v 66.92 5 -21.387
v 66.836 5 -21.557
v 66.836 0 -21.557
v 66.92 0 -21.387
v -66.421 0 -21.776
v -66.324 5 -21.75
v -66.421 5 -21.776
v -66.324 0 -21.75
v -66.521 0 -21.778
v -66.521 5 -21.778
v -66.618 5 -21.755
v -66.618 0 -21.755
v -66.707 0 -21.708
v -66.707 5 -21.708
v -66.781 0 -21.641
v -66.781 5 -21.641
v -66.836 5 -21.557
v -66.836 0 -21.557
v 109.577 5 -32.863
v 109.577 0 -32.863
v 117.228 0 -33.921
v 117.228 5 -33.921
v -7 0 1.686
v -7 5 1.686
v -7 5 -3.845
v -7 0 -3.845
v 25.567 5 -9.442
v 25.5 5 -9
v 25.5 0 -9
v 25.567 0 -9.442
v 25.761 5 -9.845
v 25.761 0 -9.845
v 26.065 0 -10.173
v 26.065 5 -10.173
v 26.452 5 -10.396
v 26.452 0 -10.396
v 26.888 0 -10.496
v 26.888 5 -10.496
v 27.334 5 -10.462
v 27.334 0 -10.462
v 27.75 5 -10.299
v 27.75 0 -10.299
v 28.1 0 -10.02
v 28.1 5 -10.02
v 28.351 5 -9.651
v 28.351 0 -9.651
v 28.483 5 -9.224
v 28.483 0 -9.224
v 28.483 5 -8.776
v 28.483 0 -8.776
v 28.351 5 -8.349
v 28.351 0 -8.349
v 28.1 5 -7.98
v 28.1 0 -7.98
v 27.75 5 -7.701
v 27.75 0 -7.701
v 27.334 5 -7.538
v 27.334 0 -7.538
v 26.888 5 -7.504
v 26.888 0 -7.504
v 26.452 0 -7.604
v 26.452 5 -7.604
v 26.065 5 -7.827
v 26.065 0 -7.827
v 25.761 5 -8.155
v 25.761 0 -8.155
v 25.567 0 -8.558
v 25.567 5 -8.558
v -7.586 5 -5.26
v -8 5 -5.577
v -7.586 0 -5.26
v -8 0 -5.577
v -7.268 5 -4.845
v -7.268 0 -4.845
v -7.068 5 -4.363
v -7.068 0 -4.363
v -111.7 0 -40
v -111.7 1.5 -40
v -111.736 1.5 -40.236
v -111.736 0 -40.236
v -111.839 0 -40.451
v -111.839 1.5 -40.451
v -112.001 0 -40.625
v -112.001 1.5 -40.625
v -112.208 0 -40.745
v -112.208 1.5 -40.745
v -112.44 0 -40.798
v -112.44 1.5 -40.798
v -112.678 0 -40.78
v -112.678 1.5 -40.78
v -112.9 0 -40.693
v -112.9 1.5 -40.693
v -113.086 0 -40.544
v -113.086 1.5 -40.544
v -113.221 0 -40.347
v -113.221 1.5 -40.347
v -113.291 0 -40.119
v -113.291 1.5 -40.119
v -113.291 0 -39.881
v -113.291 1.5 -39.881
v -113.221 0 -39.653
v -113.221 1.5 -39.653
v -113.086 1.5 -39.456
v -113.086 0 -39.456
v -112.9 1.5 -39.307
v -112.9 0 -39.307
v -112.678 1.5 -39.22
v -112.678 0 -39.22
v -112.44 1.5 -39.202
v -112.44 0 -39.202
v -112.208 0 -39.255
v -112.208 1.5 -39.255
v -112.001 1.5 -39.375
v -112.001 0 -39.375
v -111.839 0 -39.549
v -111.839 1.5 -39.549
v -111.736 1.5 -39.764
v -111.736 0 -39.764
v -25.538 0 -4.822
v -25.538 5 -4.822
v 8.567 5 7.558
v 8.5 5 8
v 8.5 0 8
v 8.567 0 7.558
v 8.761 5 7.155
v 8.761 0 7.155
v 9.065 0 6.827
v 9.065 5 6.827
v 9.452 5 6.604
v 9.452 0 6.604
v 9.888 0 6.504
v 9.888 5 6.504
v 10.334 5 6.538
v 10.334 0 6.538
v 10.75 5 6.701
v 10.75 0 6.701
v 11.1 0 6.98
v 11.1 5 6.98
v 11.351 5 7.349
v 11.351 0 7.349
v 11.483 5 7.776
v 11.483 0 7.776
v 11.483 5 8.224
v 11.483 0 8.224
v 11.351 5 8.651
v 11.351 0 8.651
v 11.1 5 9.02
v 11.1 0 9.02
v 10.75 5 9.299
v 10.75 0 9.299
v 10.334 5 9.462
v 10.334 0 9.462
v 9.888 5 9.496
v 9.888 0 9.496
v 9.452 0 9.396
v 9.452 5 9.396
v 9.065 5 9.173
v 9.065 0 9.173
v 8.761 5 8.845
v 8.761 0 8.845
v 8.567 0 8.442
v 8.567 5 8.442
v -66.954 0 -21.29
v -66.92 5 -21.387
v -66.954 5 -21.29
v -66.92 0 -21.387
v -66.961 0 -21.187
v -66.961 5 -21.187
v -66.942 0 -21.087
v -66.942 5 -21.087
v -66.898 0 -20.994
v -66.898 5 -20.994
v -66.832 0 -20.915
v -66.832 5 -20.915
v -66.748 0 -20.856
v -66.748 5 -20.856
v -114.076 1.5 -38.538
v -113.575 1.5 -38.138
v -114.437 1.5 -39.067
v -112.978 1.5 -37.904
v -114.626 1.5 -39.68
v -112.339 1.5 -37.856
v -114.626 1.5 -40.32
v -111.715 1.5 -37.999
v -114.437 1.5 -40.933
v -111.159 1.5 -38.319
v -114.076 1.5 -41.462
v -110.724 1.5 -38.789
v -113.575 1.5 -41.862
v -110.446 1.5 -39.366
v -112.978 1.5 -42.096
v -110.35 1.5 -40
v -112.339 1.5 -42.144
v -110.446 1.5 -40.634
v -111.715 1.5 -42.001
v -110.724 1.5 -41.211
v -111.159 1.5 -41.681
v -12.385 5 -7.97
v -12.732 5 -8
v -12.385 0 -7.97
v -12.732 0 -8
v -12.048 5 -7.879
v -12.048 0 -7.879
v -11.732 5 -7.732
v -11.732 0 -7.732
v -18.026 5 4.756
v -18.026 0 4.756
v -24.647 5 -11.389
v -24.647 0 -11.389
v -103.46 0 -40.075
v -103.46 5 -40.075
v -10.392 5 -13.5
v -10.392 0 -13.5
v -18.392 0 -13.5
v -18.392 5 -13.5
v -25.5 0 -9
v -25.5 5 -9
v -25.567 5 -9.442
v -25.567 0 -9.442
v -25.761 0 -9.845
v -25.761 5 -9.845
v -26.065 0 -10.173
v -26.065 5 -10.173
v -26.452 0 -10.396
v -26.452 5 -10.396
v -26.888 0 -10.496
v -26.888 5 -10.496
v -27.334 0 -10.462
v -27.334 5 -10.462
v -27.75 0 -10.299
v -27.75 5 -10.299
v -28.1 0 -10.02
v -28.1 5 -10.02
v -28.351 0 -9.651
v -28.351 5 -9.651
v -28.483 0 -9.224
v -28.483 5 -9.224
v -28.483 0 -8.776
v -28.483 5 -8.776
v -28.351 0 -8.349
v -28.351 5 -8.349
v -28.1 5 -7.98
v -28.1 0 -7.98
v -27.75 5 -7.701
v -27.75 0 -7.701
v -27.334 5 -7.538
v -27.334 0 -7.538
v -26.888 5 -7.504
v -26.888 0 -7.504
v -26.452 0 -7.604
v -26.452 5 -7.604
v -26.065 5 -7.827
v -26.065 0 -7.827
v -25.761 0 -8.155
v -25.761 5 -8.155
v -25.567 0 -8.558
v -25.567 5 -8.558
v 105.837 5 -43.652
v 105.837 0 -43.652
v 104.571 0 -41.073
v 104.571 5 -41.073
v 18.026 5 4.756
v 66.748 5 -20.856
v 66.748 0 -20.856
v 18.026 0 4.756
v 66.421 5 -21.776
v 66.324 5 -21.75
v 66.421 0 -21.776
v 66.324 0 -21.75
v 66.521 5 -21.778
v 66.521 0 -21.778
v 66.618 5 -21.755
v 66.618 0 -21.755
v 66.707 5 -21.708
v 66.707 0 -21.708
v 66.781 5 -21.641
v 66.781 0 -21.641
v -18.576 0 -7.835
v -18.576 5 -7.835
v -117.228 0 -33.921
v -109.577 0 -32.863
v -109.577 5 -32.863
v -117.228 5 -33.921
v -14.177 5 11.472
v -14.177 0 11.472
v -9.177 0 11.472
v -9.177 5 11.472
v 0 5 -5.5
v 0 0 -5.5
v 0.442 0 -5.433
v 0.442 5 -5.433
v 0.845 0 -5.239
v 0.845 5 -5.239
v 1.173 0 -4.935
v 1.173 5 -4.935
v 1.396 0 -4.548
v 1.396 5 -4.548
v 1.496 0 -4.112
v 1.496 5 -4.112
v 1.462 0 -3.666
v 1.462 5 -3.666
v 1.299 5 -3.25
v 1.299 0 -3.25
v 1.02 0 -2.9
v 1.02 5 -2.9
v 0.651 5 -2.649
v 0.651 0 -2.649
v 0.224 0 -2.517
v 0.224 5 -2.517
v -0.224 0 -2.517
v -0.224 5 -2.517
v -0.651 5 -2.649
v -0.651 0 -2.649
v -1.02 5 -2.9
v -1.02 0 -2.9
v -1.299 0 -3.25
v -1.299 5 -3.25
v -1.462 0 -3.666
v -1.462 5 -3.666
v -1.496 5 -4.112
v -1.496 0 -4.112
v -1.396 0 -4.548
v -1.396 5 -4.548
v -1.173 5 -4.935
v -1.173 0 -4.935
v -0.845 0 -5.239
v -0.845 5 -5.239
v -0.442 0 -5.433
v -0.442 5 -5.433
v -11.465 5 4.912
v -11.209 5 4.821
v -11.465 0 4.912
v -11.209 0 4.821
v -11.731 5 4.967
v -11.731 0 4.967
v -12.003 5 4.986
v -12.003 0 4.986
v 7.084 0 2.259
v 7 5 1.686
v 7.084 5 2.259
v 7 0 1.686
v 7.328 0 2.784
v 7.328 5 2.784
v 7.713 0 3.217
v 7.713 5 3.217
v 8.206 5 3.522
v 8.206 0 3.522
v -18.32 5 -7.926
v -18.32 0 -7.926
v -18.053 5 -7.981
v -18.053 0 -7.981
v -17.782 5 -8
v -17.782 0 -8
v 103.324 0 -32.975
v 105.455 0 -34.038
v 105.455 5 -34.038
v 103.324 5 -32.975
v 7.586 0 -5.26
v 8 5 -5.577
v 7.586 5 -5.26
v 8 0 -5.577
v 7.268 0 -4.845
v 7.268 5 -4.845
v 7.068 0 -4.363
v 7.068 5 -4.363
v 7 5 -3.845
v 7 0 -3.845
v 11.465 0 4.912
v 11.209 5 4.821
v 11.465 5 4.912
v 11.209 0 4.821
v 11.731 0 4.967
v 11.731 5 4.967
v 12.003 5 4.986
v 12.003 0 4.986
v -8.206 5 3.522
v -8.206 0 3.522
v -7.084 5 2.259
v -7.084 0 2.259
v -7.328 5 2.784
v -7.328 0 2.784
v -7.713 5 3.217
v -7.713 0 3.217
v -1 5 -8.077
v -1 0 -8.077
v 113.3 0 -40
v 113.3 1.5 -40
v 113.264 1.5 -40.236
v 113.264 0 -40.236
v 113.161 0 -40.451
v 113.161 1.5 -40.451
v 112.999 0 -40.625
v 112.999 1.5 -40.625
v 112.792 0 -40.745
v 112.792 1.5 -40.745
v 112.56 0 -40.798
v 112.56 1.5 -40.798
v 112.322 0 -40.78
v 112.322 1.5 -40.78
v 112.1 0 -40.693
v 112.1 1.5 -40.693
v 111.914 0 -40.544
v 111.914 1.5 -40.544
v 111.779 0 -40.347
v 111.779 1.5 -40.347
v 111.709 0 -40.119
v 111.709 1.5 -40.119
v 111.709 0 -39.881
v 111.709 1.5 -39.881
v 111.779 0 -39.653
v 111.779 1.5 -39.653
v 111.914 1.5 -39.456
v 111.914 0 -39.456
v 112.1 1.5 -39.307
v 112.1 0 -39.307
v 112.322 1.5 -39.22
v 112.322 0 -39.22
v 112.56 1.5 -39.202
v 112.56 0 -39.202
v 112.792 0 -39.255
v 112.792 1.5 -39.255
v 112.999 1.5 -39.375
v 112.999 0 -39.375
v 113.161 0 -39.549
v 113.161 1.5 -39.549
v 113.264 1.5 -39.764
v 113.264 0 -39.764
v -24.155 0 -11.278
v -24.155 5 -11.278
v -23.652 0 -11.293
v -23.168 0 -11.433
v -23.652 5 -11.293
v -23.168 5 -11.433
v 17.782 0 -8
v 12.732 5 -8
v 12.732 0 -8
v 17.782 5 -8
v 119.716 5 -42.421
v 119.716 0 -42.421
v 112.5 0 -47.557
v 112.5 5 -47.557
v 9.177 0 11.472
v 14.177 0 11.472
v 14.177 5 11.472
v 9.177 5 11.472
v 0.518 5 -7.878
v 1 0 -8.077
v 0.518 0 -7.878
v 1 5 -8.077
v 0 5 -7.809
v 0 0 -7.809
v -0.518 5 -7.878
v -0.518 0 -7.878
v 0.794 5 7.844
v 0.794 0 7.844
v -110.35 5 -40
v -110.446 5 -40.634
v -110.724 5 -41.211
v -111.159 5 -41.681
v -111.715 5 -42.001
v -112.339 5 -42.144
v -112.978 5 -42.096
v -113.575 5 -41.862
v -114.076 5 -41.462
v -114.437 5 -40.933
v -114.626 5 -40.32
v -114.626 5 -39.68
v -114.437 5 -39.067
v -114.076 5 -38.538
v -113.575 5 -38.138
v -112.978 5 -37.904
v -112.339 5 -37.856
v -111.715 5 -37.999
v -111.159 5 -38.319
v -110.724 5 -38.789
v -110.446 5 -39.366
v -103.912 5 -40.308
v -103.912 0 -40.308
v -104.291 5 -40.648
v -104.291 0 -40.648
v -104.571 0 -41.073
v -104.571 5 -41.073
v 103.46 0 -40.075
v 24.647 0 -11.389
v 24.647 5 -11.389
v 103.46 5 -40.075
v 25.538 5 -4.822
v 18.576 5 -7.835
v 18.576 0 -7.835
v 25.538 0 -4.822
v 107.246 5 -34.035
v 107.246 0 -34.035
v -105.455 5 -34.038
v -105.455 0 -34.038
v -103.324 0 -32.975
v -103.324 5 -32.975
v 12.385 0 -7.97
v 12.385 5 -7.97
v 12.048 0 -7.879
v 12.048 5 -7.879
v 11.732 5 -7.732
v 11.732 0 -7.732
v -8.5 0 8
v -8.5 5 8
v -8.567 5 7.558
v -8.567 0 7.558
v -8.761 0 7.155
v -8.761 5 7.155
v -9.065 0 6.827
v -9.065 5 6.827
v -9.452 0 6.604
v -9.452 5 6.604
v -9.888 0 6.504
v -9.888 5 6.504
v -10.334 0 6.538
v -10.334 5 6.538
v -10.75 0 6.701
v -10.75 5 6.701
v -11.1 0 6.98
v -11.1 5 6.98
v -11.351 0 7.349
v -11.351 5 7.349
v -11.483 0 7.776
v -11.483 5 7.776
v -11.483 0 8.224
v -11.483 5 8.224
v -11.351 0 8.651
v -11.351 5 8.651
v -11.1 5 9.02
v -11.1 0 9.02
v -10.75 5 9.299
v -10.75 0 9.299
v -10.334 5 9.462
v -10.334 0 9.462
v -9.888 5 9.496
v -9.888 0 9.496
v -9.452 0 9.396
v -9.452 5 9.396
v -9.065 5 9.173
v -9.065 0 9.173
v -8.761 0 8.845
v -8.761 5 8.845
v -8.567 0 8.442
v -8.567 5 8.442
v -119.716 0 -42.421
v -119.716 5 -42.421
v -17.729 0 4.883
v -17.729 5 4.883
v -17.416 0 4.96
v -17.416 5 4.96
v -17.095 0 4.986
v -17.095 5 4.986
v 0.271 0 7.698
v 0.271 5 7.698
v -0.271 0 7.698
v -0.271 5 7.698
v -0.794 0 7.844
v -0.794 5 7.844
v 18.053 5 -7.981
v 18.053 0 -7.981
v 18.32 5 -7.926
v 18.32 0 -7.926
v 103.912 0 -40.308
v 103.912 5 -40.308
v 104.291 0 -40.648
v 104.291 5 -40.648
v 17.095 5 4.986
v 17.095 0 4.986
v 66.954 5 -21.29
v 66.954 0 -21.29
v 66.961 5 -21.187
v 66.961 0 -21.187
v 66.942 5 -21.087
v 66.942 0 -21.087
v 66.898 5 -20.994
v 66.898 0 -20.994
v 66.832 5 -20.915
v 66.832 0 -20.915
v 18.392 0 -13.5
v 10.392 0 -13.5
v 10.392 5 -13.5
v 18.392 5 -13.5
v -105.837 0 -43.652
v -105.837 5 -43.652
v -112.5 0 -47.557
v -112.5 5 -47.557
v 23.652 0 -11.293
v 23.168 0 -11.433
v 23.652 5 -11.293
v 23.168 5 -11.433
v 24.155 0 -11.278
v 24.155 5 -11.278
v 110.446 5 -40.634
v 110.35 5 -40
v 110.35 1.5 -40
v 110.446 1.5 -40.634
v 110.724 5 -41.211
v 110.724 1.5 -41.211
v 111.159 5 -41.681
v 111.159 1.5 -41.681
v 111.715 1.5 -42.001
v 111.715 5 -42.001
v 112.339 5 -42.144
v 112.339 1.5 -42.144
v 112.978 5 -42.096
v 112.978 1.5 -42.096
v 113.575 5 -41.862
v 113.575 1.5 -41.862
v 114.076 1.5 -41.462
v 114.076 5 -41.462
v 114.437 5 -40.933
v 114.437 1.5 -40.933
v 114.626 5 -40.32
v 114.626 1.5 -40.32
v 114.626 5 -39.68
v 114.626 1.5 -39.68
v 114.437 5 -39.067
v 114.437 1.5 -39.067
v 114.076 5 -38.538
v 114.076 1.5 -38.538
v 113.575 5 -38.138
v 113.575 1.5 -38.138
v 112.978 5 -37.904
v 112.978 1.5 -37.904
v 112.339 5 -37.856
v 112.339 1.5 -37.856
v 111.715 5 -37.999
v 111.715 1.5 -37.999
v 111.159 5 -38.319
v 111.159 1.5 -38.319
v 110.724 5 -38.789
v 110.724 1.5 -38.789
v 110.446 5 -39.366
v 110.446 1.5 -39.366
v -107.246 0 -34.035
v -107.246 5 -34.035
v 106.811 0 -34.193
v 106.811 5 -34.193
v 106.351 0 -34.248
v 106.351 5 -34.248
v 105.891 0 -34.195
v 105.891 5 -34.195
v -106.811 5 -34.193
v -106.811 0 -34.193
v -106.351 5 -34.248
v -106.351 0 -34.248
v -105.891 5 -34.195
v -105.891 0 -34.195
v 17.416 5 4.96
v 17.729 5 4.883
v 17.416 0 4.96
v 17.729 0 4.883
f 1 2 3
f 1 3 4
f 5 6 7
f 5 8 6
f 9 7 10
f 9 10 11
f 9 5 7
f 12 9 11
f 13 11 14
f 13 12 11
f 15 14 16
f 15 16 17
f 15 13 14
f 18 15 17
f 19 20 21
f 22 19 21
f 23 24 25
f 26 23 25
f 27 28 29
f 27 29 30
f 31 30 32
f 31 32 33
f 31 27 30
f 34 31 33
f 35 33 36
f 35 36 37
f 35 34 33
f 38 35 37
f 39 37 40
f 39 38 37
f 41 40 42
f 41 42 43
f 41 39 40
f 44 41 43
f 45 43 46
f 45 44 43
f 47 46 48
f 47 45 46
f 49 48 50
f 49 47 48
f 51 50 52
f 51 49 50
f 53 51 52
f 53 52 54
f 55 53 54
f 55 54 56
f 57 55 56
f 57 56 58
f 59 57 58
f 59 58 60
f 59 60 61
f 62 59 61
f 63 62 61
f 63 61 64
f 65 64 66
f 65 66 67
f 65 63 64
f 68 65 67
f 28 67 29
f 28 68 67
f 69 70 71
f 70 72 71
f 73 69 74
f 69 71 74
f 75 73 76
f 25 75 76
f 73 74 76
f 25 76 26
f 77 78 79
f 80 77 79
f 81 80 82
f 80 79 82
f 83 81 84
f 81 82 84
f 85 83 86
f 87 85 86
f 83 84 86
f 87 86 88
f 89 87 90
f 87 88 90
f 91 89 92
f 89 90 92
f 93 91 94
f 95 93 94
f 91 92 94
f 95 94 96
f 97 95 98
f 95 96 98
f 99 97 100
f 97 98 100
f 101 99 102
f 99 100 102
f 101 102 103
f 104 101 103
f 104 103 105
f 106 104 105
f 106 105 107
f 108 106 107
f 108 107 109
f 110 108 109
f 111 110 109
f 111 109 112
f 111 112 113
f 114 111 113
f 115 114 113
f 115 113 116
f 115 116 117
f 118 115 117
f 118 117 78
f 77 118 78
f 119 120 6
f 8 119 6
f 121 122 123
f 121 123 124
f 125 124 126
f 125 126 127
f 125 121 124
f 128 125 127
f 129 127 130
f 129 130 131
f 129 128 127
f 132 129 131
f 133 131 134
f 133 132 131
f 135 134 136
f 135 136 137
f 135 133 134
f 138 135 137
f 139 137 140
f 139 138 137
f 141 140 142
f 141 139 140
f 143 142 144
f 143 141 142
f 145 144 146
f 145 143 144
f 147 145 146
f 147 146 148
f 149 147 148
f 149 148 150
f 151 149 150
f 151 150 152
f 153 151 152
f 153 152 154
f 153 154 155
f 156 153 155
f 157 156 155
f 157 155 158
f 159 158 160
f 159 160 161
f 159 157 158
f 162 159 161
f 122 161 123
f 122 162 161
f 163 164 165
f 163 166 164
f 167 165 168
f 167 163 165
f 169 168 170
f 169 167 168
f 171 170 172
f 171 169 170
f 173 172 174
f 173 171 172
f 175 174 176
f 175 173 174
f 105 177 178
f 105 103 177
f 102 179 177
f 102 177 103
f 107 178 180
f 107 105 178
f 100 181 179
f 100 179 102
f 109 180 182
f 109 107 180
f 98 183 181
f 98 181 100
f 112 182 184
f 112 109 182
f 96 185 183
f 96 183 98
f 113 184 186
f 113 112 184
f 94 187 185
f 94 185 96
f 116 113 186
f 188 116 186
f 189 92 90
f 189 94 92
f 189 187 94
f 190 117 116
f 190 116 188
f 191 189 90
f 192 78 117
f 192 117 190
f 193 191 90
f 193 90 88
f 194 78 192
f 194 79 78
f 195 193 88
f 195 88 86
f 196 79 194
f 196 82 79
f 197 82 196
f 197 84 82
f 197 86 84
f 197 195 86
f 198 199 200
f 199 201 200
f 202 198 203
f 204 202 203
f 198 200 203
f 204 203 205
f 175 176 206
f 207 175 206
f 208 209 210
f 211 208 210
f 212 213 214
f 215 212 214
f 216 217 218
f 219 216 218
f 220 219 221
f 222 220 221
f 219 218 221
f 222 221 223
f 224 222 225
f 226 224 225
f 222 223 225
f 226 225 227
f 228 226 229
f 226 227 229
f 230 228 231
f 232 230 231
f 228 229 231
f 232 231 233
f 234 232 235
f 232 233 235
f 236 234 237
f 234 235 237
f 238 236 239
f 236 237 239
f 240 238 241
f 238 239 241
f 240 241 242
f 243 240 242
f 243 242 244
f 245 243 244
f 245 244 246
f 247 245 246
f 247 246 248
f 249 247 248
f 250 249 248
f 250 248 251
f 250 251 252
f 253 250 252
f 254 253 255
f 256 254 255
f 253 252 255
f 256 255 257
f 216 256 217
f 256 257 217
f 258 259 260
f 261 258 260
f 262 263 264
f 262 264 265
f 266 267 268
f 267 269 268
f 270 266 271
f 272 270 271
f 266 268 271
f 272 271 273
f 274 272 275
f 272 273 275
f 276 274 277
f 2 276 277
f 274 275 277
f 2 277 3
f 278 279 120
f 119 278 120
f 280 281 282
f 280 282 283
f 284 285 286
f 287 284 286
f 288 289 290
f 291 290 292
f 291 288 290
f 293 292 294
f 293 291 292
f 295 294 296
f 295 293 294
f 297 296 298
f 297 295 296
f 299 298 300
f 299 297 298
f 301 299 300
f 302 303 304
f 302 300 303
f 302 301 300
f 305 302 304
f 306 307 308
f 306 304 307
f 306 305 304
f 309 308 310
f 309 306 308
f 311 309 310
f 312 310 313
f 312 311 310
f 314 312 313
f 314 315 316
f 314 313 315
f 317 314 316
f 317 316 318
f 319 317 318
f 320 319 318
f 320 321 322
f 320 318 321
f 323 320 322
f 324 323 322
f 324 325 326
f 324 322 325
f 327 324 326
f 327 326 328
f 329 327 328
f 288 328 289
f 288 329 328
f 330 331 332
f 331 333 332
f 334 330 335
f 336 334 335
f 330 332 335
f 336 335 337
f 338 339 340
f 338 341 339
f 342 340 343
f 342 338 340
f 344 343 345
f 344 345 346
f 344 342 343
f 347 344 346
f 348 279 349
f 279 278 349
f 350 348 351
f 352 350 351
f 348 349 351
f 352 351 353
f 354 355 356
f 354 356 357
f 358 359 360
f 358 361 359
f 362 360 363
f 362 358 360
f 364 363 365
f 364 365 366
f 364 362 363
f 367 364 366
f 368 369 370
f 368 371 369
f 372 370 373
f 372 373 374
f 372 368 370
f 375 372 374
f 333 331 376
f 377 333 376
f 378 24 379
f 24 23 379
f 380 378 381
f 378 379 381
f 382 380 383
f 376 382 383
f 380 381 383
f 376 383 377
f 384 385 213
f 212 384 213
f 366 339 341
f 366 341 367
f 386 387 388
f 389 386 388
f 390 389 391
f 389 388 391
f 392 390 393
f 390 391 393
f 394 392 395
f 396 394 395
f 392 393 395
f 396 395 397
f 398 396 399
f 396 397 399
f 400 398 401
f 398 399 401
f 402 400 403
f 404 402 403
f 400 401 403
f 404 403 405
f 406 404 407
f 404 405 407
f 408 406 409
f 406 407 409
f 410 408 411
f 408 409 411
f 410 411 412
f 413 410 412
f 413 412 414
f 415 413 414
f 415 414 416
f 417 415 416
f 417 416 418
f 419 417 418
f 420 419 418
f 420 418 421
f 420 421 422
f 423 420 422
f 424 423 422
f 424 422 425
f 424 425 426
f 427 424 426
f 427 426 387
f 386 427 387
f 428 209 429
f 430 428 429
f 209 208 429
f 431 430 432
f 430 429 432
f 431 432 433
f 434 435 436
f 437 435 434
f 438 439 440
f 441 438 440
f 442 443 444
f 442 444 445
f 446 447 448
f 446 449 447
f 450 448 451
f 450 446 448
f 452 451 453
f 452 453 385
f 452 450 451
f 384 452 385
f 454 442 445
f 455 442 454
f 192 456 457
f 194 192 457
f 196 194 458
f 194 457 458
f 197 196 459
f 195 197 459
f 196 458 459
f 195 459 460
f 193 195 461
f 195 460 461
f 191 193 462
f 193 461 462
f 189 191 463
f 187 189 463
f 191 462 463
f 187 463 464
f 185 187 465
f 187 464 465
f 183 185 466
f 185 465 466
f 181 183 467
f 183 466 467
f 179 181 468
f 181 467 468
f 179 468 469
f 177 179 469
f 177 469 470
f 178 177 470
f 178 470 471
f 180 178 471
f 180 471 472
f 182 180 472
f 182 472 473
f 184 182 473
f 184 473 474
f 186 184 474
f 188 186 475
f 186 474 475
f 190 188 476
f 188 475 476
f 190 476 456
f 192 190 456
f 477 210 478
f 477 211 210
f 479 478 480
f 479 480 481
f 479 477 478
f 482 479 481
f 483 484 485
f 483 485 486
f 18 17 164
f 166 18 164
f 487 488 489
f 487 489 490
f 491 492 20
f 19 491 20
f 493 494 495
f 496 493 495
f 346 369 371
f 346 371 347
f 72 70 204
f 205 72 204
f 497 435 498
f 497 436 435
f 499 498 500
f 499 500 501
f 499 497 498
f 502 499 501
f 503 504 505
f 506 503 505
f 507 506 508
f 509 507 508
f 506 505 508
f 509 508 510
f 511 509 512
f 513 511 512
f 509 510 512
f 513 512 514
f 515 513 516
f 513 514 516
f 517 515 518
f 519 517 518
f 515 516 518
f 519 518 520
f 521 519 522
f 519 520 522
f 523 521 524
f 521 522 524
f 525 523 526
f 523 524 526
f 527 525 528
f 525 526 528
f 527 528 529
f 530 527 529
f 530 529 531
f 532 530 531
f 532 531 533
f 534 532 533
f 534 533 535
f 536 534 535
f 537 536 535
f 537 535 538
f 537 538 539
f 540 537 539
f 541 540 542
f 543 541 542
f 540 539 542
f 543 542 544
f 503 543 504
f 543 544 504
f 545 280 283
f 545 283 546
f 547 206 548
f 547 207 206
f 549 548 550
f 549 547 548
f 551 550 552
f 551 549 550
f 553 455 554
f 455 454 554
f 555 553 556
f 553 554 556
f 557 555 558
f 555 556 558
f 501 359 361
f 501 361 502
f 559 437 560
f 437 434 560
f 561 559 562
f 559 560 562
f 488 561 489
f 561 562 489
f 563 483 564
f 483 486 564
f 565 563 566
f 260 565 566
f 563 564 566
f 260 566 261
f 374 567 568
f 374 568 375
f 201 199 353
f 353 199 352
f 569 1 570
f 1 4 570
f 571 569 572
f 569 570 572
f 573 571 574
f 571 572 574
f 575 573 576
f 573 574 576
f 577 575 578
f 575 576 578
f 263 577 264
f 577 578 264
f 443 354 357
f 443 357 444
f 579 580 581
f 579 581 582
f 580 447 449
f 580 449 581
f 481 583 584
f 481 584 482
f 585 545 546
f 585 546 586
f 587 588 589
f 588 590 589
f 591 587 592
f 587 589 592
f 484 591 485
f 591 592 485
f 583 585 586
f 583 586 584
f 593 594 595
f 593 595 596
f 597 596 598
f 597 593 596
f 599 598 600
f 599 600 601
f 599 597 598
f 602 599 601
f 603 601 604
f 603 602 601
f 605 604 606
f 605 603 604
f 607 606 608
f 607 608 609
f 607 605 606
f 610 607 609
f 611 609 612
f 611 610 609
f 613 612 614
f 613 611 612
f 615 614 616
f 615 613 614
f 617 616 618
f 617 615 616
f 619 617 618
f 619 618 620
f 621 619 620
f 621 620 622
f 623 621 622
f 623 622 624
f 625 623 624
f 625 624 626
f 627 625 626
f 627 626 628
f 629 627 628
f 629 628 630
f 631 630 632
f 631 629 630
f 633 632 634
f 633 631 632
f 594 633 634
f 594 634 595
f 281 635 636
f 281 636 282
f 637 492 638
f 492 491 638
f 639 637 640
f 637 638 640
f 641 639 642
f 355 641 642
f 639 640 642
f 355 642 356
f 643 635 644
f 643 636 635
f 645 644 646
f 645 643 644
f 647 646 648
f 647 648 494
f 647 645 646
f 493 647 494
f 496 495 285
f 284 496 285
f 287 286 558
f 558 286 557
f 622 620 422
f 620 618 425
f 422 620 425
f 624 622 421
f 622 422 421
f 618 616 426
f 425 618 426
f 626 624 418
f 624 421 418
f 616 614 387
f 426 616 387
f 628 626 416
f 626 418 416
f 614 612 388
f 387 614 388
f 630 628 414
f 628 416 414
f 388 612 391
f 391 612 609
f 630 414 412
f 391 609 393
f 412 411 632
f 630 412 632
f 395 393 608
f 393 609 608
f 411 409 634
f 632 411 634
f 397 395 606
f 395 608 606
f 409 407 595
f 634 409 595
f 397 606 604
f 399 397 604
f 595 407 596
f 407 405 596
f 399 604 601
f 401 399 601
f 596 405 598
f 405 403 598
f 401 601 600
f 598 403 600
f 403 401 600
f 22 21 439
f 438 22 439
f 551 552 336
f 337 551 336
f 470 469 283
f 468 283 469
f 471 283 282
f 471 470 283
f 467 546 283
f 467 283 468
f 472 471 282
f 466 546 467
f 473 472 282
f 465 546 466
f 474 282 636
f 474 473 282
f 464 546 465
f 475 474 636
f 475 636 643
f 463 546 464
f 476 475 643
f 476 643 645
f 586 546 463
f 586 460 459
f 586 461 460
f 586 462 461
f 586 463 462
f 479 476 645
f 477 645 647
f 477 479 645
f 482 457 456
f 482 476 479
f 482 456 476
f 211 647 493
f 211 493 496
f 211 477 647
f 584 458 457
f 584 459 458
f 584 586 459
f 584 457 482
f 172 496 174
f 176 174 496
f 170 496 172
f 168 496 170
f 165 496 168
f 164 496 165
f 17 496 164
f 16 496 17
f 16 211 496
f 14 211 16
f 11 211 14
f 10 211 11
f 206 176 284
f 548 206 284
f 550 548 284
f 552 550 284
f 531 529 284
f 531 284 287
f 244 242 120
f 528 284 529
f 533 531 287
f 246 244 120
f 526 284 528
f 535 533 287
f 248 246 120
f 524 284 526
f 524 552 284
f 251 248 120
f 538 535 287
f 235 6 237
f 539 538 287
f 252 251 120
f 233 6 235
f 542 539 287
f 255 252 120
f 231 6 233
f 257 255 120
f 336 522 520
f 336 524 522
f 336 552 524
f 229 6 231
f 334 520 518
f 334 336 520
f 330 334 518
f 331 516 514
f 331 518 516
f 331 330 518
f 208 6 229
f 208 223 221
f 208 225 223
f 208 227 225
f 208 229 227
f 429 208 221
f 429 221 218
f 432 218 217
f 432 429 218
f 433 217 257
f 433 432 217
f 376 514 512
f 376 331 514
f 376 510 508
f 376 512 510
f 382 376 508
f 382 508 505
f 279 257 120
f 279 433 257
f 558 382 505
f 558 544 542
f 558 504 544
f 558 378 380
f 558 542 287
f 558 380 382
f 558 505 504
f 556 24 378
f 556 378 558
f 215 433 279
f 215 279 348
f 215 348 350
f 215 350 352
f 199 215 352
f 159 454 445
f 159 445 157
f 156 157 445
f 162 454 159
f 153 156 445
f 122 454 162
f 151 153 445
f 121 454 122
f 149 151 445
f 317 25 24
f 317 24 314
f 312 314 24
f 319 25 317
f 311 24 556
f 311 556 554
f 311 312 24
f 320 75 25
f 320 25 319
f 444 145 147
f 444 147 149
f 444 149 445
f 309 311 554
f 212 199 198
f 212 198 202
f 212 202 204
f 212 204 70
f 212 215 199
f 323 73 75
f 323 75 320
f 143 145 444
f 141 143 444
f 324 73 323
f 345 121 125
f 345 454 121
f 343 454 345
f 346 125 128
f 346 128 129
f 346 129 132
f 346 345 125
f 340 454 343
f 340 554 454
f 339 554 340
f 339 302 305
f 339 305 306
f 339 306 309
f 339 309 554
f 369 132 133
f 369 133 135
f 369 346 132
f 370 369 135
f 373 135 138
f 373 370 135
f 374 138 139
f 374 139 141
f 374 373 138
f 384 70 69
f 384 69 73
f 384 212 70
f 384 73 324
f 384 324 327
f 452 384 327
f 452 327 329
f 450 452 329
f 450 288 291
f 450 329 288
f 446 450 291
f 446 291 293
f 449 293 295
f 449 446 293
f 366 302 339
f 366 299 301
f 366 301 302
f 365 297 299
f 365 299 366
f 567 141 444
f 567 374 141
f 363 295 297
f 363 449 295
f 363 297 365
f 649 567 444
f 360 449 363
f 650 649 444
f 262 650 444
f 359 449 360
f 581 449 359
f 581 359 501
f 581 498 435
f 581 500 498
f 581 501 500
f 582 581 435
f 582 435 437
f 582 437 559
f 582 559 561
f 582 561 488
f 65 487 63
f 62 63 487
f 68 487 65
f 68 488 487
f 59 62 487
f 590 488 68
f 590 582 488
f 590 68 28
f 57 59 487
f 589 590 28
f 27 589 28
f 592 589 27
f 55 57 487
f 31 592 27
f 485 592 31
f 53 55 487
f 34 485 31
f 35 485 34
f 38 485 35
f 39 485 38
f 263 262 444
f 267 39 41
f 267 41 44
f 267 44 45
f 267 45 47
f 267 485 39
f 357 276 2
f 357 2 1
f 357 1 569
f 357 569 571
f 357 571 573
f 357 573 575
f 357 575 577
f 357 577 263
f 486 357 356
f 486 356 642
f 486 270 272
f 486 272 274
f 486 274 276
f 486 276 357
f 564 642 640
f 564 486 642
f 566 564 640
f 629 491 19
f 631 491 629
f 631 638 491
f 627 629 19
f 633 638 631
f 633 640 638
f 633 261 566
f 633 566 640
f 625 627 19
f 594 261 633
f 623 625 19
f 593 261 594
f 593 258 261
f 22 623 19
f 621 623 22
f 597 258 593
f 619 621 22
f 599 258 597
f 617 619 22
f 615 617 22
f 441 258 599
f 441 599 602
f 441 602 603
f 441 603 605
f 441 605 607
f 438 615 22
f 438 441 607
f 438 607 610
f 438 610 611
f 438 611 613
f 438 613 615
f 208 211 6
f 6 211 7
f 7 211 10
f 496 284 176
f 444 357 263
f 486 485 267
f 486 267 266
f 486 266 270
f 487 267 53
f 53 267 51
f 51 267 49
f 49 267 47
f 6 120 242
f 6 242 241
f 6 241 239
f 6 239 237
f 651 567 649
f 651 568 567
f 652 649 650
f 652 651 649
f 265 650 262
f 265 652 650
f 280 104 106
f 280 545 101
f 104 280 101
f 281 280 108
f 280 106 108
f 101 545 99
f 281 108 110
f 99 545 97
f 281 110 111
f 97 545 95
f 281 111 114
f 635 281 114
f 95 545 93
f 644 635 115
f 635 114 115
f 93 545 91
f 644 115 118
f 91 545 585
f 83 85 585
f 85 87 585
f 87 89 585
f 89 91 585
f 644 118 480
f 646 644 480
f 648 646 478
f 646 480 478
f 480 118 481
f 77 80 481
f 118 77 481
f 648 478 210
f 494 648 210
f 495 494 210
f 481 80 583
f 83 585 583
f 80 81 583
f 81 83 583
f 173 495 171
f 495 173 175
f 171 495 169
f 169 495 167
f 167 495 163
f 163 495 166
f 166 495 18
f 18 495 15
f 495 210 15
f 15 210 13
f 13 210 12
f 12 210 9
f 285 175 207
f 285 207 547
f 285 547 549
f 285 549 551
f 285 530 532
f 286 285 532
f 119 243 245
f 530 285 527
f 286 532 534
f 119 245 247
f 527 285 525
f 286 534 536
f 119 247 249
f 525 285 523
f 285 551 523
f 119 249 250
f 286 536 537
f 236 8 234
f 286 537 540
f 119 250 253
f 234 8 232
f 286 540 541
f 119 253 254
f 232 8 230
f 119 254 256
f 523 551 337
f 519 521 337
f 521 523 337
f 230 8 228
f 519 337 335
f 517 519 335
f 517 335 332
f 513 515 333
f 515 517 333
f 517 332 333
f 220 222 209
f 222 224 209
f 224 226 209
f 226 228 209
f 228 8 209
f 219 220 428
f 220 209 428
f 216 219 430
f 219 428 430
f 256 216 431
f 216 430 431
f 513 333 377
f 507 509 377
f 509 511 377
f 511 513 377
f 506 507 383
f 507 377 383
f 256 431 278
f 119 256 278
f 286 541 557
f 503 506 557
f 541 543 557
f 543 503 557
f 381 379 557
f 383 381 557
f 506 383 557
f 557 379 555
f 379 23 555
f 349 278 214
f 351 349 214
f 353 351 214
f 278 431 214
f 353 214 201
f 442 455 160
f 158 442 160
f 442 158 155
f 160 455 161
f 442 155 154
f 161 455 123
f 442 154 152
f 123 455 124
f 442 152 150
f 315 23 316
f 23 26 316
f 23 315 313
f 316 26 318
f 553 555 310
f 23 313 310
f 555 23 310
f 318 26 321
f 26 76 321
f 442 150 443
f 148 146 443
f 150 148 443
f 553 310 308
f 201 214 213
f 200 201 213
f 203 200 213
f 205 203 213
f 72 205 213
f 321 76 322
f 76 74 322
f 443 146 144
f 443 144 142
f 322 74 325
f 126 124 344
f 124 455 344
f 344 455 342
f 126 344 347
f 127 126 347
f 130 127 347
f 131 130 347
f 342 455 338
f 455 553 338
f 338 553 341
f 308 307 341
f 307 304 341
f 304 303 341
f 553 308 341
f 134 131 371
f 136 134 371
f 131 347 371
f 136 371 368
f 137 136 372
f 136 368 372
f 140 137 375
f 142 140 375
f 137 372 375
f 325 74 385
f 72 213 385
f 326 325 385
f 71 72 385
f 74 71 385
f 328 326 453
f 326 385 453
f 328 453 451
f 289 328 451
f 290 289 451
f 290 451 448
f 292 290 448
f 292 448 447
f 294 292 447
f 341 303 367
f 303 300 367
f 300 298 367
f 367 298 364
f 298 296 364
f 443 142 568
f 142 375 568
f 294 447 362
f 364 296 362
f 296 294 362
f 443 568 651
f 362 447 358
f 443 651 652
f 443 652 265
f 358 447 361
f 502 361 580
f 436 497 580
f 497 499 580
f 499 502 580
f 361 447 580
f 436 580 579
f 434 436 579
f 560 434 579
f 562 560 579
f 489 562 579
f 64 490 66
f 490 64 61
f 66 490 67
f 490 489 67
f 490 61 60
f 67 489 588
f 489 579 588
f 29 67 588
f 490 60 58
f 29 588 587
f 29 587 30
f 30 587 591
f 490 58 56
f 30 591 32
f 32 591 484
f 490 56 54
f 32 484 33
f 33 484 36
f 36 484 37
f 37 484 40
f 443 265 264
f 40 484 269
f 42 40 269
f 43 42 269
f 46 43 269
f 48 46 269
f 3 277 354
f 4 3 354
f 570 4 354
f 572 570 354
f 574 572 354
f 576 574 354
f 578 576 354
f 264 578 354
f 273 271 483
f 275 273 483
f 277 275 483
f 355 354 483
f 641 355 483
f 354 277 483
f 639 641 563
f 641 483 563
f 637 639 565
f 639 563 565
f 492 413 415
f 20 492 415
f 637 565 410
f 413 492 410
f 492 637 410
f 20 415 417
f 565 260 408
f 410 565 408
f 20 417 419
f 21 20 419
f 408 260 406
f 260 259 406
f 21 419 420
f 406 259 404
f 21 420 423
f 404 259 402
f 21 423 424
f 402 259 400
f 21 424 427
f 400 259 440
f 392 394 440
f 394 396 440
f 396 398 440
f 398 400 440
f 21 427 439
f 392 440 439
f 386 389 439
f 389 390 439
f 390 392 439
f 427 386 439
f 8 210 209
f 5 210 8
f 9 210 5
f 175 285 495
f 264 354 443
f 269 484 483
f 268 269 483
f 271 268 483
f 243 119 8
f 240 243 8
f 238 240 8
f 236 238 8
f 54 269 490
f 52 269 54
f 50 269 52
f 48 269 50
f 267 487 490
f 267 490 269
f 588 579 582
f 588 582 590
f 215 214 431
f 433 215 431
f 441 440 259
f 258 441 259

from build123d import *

# Parameters (mm, degrees)
EXTRUDE_1_DEPTH        = 5
EXTRUDE_2_DEPTH        = 5
SKETCH_5_R             = 2.15
CUT_EXTRUDE_3_DEPTH    = 3.5
CUT_EXTRUDE_4_DEPTH    = 5
SKETCH_8_R             = 1.5
CUT_EXTRUDE_5_DEPTH    = 5
FILLET_1_R             = 2
FILLET_2_R             = 0.4
FILLET_4_R             = 2
FILLET_1_OF_MIRROR_2_R = 2
FILLET_2_OF_MIRROR_2_R = 0.4
FILLET_4_OF_MIRROR_2_R = 2
FILLET_3_R             = 2
SKETCH_10_R            = 0.8
CUT_EXTRUDE_6_DEPTH    = 10


with BuildPart() as part:
    # 草图2 → 凸台-拉伸1 (new body)
    with BuildSketch(Plane(origin=(0, 0, 0), x_dir=(1, 0, 0), z_dir=(0, 1, 0))):
        Polygon((0, -7.5), (0, 7.5), (-10.392304845, 13.5), (-18.392304845, 13.5), (-23.898712869, 11.116835995), (-104.216362147, 40.350069618), (-106.3513241, 34.484309861), (-103.323886643, 32.974885226), (-14.177346707, -11.471940008), (-9.177346707, -11.471940008), align=None)
    extrude_1 = extrude(amount=EXTRUDE_1_DEPTH)

    # 草图4 → 凸台-拉伸2 (add)
    with BuildSketch(Plane(origin=(0, 0, 0), x_dir=(1, 0, 0), z_dir=(0, 1, 0))):
        Polygon((-105.836537935, 43.651722154), (-104.216362147, 40.350069618), (-106.3513241, 34.484309861), (-109.577310483, 32.862960495), (-117.227960723, 33.920942119), (-119.716156877, 42.421286113), (-112.5, 47.556853078), align=None)
    extrude_2 = extrude(amount=EXTRUDE_2_DEPTH)

    # 草图5 → 切除-拉伸3 (cut)
    with BuildSketch(Plane(origin=(0, 5, 0), x_dir=(1, 0, 0), z_dir=(0, 1, 0))):
        with Locations((-112.5, 40)):
            Circle(SKETCH_5_R)
    cut_extrude_3 = extrude(amount=-CUT_EXTRUDE_3_DEPTH, mode=Mode.SUBTRACT)

    # 草图6 → 切除-拉伸4 (cut)
    with BuildSketch(Plane(origin=(0, 5, 0), x_dir=(1, 0, 0), z_dir=(0, 1, 0))):
        Polygon((-25.538029788, 4.822447994), (-66.670701963, 21.893639642), (-67.092623285, 21.03753444), (-17.588673353, -4.985970004), (-11.588673353, -4.985970004), (-7, -3), (-7, 0), (-7, 5), (-12.196152423, 8), (-18.196152423, 8), align=None)
    cut_extrude_4 = extrude(amount=-CUT_EXTRUDE_4_DEPTH, mode=Mode.SUBTRACT)

    # 草图8 → 切除-拉伸5 (cut)
    with BuildSketch(Plane(origin=(0, 5, 0), x_dir=(1, 0, 0), z_dir=(0, 1, 0))):
        with Locations((0, 4)):
            Circle(SKETCH_8_R)
        with Locations((-10, -8)):
            Circle(SKETCH_8_R)
        with Locations((-27, 9)):
            Circle(SKETCH_8_R)
    cut_extrude_5 = extrude(amount=-CUT_EXTRUDE_5_DEPTH, mode=Mode.SUBTRACT)

    # 圆角1
    fillet_1_edges = [part.edges().sort_by_distance(p)[0] for p in [
        (-23.898712869, 2.5, -11.116835995),
        (-18.196152423, 2.5, -8),
        (-12.196152423, 2.5, -8),
        (-7, 2.5, -5),
        (-7, 2.5, 3),
        (-11.588673353, 2.5, 4.985970004),
        (-17.588673353, 2.5, 4.985970004),
    ]]
    fillet(fillet_1_edges, radius=FILLET_1_R)

    # 圆角2
    fillet_2_edges = [part.edges().sort_by_distance(p)[0] for p in [
        (-67.092623285, 2.5, -21.03753444),
        (-66.670701963, 2.5, -21.893639642),
    ]]
    fillet(fillet_2_edges, radius=FILLET_2_R)

    # 圆角4
    fillet_4_edges = [part.edges().sort_by_distance(p)[0] for p in [
        (-106.3513241, 2.5, -34.484309861),
        (-104.216362147, 2.5, -40.350069618),
    ]]
    fillet(fillet_4_edges, radius=FILLET_4_R)

    # 镜向2: 凸台-拉伸1, 凸台-拉伸2, 切除-拉伸3, 切除-拉伸4, 切除-拉伸5 across Right Plane
    add(extrude_1.mirror(Plane(origin=(0, 0, 0), x_dir=(0, 0, -1), z_dir=(1, 0, 0))))
    add(extrude_2.mirror(Plane(origin=(0, 0, 0), x_dir=(0, 0, -1), z_dir=(1, 0, 0))))
    add(cut_extrude_3.mirror(Plane(origin=(0, 0, 0), x_dir=(0, 0, -1), z_dir=(1, 0, 0))), mode=Mode.SUBTRACT)
    add(cut_extrude_4.mirror(Plane(origin=(0, 0, 0), x_dir=(0, 0, -1), z_dir=(1, 0, 0))), mode=Mode.SUBTRACT)
    add(cut_extrude_5.mirror(Plane(origin=(0, 0, 0), x_dir=(0, 0, -1), z_dir=(1, 0, 0))), mode=Mode.SUBTRACT)

    # 圆角1 of 镜向2
    fillet_1_of_mirror_2_edges = [part.edges().sort_by_distance(p)[0] for p in [
        (23.898712869, 2.5, -11.116835995),
        (18.196152423, 2.5, -8),
        (12.196152423, 2.5, -8),
        (7, 2.5, -5),
        (7, 2.5, 3),
        (11.588673353, 2.5, 4.985970004),
        (17.588673353, 2.5, 4.985970004),
    ]]
    fillet(fillet_1_of_mirror_2_edges, radius=FILLET_1_OF_MIRROR_2_R)

    # 圆角2 of 镜向2
    fillet_2_of_mirror_2_edges = [part.edges().sort_by_distance(p)[0] for p in [
        (67.092623285, 2.5, -21.03753444),
        (66.670701963, 2.5, -21.893639642),
    ]]
    fillet(fillet_2_of_mirror_2_edges, radius=FILLET_2_OF_MIRROR_2_R)

    # 圆角4 of 镜向2
    fillet_4_of_mirror_2_edges = [part.edges().sort_by_distance(p)[0] for p in [
        (106.3513241, 2.5, -34.484309861),
        (104.216362147, 2.5, -40.350069618),
    ]]
    fillet(fillet_4_of_mirror_2_edges, radius=FILLET_4_OF_MIRROR_2_R)

    # 圆角3
    fillet_3_edges = [part.edges().sort_by_distance(p)[0] for p in [
        (0, 2.5, -7.5),
        (0, 2.5, 7.5),
    ]]
    fillet(fillet_3_edges, radius=FILLET_3_R)

    # 草图10 → 切除-拉伸6 (cut)
    with BuildSketch(Plane(origin=(0, 1.5, 0), x_dir=(1, 0, 0), z_dir=(0, 1, 0))):
        with Locations((-112.5, 40)):
            Circle(SKETCH_10_R)
        with Locations((112.5, 40)):
            Circle(SKETCH_10_R)
    extrude(amount=-CUT_EXTRUDE_6_DEPTH, mode=Mode.SUBTRACT)


solid = part.part
